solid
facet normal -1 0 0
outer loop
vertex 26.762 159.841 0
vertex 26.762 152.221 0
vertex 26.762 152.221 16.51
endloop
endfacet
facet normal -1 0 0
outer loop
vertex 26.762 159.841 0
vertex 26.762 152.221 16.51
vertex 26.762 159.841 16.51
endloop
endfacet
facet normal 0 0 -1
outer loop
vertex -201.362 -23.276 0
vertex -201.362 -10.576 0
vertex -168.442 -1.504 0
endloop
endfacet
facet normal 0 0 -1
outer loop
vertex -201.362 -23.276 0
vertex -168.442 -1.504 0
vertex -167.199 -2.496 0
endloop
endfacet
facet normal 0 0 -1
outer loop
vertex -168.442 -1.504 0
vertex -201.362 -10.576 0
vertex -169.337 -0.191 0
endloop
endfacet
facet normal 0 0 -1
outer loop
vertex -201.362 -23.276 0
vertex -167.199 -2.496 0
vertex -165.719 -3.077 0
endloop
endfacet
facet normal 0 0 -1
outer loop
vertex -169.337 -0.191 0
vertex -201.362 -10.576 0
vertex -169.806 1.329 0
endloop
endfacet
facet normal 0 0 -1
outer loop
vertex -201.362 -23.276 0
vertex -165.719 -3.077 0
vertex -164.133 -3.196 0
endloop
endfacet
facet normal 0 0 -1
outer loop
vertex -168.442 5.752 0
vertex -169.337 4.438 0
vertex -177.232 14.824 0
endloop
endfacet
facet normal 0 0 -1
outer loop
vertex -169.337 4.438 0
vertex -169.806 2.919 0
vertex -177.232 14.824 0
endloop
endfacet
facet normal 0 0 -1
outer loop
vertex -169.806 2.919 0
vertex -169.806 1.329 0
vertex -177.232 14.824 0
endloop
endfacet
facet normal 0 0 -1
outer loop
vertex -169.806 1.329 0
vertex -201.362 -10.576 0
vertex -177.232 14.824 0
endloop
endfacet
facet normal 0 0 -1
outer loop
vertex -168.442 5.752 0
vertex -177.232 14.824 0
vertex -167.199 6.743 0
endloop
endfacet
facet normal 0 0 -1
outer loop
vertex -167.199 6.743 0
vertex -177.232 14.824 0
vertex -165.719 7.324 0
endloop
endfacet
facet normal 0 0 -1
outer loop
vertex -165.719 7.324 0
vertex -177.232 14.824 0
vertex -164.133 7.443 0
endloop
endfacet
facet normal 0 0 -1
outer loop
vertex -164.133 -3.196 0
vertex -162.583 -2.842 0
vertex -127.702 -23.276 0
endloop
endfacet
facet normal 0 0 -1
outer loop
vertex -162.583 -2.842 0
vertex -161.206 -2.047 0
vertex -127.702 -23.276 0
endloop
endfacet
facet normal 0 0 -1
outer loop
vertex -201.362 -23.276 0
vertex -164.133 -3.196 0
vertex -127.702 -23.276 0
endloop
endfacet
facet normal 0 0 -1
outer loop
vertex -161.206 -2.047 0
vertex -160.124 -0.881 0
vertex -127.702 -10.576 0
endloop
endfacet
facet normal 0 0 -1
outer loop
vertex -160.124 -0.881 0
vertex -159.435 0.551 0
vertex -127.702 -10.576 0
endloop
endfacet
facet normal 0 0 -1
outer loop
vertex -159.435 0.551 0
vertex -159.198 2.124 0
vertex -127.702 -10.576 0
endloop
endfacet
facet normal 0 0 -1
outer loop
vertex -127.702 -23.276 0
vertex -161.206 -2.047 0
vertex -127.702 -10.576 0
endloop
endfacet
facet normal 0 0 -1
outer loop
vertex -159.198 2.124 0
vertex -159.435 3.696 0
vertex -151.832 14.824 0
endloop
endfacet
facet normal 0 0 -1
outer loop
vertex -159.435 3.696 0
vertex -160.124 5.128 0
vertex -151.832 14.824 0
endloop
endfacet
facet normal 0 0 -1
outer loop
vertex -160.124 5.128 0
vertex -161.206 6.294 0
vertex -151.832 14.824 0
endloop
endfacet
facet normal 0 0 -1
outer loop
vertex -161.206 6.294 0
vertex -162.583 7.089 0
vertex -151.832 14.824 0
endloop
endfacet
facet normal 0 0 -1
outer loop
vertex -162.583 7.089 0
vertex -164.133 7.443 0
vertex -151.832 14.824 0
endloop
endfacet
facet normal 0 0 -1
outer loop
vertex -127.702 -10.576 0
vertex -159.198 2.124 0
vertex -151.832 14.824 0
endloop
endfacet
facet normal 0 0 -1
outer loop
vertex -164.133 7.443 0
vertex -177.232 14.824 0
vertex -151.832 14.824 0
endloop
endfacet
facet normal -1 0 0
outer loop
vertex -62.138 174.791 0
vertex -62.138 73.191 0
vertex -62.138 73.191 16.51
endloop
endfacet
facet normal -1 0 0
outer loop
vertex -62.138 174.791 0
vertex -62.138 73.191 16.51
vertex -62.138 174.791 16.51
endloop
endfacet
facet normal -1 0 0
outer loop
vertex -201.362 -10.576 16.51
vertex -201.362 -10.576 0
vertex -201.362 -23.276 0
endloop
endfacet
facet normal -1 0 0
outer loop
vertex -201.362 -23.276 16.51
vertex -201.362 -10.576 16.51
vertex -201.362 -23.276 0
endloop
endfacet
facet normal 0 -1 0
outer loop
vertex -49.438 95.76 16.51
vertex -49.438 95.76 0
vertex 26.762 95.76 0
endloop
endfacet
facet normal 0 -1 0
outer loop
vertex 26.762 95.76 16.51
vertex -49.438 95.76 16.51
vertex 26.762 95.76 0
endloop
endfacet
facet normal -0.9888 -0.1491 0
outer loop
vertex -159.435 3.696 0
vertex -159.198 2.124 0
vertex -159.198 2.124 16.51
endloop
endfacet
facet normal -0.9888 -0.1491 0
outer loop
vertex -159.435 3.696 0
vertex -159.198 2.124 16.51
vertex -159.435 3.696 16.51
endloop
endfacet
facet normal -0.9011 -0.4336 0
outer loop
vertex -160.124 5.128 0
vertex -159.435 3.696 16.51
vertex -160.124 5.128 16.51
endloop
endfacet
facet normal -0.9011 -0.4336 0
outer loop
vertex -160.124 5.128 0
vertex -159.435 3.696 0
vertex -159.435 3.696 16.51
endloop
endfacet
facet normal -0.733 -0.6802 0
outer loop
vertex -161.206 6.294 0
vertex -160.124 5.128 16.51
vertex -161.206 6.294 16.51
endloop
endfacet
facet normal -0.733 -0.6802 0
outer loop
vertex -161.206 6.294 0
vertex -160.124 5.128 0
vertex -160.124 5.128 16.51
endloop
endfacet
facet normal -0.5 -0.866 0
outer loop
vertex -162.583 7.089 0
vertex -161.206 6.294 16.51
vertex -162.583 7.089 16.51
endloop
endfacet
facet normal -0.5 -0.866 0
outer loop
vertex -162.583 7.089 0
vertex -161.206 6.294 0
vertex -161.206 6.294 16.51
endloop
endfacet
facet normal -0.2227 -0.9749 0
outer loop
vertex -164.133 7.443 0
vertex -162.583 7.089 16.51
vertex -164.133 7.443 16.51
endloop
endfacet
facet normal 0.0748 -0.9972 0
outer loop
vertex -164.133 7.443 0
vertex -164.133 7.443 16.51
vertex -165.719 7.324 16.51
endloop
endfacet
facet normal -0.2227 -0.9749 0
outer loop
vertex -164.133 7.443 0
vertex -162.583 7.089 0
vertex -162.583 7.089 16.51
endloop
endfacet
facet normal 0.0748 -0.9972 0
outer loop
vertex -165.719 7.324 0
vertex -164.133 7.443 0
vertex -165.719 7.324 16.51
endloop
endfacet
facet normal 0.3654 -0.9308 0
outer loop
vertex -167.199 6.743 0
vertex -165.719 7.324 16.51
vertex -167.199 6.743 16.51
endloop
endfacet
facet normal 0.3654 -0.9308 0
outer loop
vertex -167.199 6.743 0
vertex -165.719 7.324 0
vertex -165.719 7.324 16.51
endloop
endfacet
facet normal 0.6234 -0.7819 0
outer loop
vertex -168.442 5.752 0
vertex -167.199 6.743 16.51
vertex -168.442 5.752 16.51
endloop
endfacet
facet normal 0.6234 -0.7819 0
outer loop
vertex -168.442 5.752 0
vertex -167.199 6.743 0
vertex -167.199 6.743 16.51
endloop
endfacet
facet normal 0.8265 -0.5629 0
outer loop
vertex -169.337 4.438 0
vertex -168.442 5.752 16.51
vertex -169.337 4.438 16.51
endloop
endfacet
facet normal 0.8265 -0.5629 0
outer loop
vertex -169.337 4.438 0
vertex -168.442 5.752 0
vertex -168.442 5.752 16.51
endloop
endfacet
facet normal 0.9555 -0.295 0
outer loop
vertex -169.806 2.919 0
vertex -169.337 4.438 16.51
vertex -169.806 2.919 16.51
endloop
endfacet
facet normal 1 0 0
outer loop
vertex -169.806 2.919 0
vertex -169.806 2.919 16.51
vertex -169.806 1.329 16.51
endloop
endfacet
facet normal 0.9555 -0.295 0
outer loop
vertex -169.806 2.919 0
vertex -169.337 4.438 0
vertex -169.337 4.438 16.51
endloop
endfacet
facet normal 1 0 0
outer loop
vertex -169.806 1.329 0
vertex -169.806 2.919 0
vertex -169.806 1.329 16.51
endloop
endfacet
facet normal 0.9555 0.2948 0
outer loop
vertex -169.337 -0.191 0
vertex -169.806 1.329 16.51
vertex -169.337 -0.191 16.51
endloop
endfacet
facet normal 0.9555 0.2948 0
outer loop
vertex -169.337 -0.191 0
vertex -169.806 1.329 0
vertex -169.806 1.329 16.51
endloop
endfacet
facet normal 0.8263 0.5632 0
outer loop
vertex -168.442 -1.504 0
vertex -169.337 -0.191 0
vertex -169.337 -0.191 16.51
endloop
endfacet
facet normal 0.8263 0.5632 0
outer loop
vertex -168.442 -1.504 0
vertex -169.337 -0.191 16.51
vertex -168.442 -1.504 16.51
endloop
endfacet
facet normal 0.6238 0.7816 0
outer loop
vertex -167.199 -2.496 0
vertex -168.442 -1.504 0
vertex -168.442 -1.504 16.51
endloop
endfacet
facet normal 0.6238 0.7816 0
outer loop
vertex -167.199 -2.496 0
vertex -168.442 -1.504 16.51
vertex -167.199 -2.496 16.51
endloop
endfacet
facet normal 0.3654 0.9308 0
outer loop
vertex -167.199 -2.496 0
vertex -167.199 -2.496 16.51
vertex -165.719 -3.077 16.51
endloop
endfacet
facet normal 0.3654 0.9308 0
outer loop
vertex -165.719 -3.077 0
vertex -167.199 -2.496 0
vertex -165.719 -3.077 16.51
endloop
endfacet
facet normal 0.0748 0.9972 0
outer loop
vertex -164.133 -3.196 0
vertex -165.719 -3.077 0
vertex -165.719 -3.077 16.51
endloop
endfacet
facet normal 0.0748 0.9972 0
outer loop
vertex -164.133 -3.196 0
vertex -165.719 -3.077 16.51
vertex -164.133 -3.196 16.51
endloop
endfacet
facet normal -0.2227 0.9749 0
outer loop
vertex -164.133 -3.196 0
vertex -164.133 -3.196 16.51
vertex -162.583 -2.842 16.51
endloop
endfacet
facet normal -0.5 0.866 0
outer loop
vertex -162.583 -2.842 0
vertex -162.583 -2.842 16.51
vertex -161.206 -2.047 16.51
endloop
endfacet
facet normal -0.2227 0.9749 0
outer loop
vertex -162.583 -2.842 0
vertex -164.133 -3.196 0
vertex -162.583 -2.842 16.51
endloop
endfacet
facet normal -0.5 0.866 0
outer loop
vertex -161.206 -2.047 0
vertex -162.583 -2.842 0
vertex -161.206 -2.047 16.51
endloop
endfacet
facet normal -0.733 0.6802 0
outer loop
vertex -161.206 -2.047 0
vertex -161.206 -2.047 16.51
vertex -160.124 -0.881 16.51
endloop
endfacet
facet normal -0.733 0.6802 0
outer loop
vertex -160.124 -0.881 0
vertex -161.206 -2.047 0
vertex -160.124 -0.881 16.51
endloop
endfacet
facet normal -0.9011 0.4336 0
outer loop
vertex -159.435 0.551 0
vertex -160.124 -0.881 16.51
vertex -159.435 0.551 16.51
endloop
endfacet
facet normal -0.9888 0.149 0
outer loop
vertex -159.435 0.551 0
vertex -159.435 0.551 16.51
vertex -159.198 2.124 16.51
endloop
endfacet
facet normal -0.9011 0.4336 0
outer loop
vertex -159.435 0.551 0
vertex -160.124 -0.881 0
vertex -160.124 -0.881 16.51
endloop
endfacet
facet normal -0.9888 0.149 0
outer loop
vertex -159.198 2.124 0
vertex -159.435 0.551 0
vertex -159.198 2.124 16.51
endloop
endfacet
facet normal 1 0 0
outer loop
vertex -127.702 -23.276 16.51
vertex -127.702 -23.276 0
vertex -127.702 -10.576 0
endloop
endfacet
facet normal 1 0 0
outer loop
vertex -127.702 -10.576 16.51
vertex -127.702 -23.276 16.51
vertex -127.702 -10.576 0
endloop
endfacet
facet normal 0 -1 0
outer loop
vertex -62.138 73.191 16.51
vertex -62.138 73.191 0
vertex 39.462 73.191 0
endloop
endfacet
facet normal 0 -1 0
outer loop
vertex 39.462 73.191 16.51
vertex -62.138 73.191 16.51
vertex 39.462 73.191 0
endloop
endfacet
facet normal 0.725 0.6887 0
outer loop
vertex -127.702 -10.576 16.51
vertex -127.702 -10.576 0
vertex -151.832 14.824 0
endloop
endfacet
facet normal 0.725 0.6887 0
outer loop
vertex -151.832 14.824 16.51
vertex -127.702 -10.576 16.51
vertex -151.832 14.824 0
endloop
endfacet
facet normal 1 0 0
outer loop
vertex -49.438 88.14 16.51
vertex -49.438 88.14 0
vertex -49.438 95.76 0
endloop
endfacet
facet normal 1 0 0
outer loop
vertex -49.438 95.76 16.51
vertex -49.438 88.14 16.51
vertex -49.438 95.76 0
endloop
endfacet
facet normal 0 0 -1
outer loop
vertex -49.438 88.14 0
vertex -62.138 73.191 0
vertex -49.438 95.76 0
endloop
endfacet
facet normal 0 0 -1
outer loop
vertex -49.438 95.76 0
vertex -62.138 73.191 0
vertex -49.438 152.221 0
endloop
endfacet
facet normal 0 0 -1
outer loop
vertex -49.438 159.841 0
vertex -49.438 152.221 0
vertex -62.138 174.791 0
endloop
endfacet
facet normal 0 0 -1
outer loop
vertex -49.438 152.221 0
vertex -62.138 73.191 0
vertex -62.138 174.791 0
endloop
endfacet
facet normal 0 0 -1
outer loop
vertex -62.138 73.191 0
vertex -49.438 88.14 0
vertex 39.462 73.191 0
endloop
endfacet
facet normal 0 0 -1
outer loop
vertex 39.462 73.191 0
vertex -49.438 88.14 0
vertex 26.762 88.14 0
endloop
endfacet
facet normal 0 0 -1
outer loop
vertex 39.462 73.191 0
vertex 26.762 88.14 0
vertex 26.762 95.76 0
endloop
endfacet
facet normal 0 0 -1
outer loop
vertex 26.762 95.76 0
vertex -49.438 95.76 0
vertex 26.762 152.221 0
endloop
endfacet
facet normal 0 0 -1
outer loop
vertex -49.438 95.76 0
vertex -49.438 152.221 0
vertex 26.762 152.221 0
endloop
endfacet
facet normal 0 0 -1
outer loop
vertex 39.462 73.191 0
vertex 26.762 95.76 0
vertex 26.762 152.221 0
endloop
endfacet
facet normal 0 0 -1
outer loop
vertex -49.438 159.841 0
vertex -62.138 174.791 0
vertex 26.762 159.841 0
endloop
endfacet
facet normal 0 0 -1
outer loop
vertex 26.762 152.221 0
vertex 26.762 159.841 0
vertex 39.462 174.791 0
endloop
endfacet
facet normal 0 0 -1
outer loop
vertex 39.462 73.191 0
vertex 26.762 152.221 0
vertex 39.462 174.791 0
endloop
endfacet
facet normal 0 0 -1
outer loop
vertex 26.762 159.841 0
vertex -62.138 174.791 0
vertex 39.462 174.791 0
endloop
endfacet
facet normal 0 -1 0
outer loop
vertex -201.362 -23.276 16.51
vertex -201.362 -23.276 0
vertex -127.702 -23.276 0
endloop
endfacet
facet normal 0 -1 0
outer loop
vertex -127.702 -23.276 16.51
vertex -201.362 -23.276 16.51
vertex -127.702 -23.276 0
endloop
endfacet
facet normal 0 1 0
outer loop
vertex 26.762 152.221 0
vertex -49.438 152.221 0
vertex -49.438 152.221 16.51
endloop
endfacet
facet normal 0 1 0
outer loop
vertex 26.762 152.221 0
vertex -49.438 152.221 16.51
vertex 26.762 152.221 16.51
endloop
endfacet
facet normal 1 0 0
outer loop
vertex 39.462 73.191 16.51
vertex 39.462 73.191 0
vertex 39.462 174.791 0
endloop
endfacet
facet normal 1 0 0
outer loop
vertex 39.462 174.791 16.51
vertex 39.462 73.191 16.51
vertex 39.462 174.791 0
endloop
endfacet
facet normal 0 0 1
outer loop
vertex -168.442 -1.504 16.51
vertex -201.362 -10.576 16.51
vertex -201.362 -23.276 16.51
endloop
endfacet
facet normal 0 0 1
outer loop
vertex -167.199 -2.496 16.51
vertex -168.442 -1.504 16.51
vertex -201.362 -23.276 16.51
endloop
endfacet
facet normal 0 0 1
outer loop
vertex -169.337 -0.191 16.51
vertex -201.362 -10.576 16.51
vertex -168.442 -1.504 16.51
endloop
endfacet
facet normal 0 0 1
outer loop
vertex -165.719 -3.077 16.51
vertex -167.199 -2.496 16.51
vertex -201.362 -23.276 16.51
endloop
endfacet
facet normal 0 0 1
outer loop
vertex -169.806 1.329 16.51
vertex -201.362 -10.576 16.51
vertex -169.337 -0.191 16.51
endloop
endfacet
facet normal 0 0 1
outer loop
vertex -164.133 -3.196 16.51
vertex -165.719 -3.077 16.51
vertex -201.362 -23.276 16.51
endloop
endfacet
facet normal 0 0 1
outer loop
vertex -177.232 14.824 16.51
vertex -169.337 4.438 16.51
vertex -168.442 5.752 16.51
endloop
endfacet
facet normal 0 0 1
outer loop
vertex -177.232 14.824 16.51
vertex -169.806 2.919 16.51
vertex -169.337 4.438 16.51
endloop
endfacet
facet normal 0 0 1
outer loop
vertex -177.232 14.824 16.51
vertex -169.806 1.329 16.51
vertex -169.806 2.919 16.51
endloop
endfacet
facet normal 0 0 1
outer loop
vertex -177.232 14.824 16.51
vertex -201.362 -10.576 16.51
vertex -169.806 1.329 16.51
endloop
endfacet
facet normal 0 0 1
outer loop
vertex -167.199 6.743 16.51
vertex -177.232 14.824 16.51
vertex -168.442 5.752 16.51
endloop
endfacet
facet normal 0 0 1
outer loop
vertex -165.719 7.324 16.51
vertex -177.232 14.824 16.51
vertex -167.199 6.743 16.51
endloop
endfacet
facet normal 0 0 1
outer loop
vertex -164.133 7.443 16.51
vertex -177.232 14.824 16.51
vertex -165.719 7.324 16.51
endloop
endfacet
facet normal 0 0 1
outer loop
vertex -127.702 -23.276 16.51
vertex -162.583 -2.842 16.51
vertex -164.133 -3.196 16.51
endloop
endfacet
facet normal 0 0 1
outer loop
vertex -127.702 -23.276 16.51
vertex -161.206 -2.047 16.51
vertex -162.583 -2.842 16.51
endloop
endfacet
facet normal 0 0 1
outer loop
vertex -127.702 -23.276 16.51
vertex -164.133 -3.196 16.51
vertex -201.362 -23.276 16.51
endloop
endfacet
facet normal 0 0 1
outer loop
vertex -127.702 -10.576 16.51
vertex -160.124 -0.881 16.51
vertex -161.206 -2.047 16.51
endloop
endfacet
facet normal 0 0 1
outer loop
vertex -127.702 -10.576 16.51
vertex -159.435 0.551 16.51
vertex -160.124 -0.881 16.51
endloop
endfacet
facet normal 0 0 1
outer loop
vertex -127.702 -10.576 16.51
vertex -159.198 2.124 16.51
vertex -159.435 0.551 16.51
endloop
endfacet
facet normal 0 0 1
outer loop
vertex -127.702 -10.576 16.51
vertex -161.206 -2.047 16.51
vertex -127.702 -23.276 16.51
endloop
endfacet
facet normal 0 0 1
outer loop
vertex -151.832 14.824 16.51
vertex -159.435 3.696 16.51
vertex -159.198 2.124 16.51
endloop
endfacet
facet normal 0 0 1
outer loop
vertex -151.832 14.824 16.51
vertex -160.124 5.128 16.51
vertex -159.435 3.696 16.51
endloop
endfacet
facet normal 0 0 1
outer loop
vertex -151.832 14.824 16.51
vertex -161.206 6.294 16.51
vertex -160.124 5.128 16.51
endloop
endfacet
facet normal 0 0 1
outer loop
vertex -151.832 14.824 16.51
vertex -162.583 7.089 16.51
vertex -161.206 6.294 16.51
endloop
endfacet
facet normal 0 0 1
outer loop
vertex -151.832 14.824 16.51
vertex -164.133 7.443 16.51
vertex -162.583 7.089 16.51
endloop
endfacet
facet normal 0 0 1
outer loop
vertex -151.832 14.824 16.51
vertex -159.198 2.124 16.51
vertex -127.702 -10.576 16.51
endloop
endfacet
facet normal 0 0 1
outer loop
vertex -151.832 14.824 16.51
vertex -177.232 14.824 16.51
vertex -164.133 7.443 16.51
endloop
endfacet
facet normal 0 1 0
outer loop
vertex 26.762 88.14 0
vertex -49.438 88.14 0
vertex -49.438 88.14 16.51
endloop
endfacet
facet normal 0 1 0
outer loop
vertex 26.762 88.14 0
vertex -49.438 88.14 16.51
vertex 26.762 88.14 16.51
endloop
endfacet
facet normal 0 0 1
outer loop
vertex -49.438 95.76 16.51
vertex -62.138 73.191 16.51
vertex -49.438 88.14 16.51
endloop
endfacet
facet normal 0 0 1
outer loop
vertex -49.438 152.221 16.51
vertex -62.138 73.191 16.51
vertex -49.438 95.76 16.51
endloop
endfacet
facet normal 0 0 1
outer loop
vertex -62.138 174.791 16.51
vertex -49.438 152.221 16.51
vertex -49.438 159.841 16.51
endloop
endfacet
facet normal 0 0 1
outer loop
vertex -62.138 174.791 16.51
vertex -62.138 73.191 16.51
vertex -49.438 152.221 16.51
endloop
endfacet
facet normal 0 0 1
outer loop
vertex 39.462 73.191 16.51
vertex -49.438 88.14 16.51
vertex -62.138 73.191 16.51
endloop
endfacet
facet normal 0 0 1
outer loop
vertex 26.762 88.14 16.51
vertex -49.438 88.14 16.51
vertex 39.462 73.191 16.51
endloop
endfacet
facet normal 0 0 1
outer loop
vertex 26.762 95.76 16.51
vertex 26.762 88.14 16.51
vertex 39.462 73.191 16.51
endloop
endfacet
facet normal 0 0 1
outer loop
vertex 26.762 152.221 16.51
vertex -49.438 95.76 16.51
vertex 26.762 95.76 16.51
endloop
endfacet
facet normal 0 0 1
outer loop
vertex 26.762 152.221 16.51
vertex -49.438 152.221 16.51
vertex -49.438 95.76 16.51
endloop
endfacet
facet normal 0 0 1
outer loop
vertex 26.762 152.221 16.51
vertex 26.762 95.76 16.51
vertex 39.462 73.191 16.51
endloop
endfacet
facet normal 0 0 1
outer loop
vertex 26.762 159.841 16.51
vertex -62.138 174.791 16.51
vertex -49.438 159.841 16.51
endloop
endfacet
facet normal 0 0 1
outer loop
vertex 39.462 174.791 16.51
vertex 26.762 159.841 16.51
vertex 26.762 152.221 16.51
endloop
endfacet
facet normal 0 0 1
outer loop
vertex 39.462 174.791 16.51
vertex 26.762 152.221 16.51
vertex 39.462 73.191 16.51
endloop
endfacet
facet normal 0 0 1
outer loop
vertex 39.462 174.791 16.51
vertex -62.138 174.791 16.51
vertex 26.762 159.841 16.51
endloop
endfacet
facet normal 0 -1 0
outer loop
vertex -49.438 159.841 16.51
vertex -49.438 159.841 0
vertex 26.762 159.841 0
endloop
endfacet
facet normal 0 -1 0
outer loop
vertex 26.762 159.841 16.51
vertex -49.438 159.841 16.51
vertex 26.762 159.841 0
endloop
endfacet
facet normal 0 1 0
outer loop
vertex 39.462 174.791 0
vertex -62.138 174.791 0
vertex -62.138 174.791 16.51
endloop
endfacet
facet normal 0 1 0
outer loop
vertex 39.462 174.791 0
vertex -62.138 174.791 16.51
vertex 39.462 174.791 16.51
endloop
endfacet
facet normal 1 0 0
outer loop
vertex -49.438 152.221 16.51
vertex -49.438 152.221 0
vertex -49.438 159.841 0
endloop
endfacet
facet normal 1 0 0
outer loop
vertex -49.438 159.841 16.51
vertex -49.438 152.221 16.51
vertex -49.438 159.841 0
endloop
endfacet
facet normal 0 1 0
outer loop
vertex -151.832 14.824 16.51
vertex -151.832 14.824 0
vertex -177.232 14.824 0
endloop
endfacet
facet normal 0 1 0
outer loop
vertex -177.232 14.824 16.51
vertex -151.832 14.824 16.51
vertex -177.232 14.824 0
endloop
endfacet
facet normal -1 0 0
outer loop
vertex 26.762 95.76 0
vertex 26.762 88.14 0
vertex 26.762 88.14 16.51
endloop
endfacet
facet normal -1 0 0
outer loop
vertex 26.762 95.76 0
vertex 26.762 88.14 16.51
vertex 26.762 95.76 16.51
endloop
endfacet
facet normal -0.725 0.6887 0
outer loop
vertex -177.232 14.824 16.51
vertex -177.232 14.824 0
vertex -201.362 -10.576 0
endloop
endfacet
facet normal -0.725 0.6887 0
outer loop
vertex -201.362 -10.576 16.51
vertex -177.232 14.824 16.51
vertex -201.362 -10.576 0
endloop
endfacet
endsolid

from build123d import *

# Parameters (mm, degrees)
F0_W     = 101.6
F0_H     = 101.6
F0_W_2   = 76.2
F0_H_2   = 7.62
F1_DEPTH = 16.51
F2_R     = 5.334
F3_DEPTH = 16.51


with BuildPart() as f1:
    # F0 (on Top) → F1 (new body)
    with BuildSketch(Plane.XY):
        with Locations((-11.337524, 123.990654)):
            Rectangle(F0_W, F0_H)
        with Locations((-11.337524, 91.950031)):
            Rectangle(F0_W_2, F0_H_2, mode=Mode.SUBTRACT)
        with Locations((-11.337524, 156.031277)):
            Rectangle(F0_W_2, F0_H_2, mode=Mode.SUBTRACT)
    extrude(amount=F1_DEPTH)


with BuildPart() as f3:
    # F2 (on Top) → F3 (new body)
    with BuildSketch(Plane.XY):
        Polygon((-201.361577, -10.576424), (-201.361577, -23.276424), (-127.701577, -23.276424), (-127.701577, -10.576424), (-151.831577, 14.823576), (-164.531577, 14.823576), (-177.231577, 14.823576), align=None)
        with Locations((-164.531577, 2.123576)):
            Circle(F2_R, mode=Mode.SUBTRACT)
    extrude(amount=F3_DEPTH)


solid = Compound([f1.part, f3.part])
